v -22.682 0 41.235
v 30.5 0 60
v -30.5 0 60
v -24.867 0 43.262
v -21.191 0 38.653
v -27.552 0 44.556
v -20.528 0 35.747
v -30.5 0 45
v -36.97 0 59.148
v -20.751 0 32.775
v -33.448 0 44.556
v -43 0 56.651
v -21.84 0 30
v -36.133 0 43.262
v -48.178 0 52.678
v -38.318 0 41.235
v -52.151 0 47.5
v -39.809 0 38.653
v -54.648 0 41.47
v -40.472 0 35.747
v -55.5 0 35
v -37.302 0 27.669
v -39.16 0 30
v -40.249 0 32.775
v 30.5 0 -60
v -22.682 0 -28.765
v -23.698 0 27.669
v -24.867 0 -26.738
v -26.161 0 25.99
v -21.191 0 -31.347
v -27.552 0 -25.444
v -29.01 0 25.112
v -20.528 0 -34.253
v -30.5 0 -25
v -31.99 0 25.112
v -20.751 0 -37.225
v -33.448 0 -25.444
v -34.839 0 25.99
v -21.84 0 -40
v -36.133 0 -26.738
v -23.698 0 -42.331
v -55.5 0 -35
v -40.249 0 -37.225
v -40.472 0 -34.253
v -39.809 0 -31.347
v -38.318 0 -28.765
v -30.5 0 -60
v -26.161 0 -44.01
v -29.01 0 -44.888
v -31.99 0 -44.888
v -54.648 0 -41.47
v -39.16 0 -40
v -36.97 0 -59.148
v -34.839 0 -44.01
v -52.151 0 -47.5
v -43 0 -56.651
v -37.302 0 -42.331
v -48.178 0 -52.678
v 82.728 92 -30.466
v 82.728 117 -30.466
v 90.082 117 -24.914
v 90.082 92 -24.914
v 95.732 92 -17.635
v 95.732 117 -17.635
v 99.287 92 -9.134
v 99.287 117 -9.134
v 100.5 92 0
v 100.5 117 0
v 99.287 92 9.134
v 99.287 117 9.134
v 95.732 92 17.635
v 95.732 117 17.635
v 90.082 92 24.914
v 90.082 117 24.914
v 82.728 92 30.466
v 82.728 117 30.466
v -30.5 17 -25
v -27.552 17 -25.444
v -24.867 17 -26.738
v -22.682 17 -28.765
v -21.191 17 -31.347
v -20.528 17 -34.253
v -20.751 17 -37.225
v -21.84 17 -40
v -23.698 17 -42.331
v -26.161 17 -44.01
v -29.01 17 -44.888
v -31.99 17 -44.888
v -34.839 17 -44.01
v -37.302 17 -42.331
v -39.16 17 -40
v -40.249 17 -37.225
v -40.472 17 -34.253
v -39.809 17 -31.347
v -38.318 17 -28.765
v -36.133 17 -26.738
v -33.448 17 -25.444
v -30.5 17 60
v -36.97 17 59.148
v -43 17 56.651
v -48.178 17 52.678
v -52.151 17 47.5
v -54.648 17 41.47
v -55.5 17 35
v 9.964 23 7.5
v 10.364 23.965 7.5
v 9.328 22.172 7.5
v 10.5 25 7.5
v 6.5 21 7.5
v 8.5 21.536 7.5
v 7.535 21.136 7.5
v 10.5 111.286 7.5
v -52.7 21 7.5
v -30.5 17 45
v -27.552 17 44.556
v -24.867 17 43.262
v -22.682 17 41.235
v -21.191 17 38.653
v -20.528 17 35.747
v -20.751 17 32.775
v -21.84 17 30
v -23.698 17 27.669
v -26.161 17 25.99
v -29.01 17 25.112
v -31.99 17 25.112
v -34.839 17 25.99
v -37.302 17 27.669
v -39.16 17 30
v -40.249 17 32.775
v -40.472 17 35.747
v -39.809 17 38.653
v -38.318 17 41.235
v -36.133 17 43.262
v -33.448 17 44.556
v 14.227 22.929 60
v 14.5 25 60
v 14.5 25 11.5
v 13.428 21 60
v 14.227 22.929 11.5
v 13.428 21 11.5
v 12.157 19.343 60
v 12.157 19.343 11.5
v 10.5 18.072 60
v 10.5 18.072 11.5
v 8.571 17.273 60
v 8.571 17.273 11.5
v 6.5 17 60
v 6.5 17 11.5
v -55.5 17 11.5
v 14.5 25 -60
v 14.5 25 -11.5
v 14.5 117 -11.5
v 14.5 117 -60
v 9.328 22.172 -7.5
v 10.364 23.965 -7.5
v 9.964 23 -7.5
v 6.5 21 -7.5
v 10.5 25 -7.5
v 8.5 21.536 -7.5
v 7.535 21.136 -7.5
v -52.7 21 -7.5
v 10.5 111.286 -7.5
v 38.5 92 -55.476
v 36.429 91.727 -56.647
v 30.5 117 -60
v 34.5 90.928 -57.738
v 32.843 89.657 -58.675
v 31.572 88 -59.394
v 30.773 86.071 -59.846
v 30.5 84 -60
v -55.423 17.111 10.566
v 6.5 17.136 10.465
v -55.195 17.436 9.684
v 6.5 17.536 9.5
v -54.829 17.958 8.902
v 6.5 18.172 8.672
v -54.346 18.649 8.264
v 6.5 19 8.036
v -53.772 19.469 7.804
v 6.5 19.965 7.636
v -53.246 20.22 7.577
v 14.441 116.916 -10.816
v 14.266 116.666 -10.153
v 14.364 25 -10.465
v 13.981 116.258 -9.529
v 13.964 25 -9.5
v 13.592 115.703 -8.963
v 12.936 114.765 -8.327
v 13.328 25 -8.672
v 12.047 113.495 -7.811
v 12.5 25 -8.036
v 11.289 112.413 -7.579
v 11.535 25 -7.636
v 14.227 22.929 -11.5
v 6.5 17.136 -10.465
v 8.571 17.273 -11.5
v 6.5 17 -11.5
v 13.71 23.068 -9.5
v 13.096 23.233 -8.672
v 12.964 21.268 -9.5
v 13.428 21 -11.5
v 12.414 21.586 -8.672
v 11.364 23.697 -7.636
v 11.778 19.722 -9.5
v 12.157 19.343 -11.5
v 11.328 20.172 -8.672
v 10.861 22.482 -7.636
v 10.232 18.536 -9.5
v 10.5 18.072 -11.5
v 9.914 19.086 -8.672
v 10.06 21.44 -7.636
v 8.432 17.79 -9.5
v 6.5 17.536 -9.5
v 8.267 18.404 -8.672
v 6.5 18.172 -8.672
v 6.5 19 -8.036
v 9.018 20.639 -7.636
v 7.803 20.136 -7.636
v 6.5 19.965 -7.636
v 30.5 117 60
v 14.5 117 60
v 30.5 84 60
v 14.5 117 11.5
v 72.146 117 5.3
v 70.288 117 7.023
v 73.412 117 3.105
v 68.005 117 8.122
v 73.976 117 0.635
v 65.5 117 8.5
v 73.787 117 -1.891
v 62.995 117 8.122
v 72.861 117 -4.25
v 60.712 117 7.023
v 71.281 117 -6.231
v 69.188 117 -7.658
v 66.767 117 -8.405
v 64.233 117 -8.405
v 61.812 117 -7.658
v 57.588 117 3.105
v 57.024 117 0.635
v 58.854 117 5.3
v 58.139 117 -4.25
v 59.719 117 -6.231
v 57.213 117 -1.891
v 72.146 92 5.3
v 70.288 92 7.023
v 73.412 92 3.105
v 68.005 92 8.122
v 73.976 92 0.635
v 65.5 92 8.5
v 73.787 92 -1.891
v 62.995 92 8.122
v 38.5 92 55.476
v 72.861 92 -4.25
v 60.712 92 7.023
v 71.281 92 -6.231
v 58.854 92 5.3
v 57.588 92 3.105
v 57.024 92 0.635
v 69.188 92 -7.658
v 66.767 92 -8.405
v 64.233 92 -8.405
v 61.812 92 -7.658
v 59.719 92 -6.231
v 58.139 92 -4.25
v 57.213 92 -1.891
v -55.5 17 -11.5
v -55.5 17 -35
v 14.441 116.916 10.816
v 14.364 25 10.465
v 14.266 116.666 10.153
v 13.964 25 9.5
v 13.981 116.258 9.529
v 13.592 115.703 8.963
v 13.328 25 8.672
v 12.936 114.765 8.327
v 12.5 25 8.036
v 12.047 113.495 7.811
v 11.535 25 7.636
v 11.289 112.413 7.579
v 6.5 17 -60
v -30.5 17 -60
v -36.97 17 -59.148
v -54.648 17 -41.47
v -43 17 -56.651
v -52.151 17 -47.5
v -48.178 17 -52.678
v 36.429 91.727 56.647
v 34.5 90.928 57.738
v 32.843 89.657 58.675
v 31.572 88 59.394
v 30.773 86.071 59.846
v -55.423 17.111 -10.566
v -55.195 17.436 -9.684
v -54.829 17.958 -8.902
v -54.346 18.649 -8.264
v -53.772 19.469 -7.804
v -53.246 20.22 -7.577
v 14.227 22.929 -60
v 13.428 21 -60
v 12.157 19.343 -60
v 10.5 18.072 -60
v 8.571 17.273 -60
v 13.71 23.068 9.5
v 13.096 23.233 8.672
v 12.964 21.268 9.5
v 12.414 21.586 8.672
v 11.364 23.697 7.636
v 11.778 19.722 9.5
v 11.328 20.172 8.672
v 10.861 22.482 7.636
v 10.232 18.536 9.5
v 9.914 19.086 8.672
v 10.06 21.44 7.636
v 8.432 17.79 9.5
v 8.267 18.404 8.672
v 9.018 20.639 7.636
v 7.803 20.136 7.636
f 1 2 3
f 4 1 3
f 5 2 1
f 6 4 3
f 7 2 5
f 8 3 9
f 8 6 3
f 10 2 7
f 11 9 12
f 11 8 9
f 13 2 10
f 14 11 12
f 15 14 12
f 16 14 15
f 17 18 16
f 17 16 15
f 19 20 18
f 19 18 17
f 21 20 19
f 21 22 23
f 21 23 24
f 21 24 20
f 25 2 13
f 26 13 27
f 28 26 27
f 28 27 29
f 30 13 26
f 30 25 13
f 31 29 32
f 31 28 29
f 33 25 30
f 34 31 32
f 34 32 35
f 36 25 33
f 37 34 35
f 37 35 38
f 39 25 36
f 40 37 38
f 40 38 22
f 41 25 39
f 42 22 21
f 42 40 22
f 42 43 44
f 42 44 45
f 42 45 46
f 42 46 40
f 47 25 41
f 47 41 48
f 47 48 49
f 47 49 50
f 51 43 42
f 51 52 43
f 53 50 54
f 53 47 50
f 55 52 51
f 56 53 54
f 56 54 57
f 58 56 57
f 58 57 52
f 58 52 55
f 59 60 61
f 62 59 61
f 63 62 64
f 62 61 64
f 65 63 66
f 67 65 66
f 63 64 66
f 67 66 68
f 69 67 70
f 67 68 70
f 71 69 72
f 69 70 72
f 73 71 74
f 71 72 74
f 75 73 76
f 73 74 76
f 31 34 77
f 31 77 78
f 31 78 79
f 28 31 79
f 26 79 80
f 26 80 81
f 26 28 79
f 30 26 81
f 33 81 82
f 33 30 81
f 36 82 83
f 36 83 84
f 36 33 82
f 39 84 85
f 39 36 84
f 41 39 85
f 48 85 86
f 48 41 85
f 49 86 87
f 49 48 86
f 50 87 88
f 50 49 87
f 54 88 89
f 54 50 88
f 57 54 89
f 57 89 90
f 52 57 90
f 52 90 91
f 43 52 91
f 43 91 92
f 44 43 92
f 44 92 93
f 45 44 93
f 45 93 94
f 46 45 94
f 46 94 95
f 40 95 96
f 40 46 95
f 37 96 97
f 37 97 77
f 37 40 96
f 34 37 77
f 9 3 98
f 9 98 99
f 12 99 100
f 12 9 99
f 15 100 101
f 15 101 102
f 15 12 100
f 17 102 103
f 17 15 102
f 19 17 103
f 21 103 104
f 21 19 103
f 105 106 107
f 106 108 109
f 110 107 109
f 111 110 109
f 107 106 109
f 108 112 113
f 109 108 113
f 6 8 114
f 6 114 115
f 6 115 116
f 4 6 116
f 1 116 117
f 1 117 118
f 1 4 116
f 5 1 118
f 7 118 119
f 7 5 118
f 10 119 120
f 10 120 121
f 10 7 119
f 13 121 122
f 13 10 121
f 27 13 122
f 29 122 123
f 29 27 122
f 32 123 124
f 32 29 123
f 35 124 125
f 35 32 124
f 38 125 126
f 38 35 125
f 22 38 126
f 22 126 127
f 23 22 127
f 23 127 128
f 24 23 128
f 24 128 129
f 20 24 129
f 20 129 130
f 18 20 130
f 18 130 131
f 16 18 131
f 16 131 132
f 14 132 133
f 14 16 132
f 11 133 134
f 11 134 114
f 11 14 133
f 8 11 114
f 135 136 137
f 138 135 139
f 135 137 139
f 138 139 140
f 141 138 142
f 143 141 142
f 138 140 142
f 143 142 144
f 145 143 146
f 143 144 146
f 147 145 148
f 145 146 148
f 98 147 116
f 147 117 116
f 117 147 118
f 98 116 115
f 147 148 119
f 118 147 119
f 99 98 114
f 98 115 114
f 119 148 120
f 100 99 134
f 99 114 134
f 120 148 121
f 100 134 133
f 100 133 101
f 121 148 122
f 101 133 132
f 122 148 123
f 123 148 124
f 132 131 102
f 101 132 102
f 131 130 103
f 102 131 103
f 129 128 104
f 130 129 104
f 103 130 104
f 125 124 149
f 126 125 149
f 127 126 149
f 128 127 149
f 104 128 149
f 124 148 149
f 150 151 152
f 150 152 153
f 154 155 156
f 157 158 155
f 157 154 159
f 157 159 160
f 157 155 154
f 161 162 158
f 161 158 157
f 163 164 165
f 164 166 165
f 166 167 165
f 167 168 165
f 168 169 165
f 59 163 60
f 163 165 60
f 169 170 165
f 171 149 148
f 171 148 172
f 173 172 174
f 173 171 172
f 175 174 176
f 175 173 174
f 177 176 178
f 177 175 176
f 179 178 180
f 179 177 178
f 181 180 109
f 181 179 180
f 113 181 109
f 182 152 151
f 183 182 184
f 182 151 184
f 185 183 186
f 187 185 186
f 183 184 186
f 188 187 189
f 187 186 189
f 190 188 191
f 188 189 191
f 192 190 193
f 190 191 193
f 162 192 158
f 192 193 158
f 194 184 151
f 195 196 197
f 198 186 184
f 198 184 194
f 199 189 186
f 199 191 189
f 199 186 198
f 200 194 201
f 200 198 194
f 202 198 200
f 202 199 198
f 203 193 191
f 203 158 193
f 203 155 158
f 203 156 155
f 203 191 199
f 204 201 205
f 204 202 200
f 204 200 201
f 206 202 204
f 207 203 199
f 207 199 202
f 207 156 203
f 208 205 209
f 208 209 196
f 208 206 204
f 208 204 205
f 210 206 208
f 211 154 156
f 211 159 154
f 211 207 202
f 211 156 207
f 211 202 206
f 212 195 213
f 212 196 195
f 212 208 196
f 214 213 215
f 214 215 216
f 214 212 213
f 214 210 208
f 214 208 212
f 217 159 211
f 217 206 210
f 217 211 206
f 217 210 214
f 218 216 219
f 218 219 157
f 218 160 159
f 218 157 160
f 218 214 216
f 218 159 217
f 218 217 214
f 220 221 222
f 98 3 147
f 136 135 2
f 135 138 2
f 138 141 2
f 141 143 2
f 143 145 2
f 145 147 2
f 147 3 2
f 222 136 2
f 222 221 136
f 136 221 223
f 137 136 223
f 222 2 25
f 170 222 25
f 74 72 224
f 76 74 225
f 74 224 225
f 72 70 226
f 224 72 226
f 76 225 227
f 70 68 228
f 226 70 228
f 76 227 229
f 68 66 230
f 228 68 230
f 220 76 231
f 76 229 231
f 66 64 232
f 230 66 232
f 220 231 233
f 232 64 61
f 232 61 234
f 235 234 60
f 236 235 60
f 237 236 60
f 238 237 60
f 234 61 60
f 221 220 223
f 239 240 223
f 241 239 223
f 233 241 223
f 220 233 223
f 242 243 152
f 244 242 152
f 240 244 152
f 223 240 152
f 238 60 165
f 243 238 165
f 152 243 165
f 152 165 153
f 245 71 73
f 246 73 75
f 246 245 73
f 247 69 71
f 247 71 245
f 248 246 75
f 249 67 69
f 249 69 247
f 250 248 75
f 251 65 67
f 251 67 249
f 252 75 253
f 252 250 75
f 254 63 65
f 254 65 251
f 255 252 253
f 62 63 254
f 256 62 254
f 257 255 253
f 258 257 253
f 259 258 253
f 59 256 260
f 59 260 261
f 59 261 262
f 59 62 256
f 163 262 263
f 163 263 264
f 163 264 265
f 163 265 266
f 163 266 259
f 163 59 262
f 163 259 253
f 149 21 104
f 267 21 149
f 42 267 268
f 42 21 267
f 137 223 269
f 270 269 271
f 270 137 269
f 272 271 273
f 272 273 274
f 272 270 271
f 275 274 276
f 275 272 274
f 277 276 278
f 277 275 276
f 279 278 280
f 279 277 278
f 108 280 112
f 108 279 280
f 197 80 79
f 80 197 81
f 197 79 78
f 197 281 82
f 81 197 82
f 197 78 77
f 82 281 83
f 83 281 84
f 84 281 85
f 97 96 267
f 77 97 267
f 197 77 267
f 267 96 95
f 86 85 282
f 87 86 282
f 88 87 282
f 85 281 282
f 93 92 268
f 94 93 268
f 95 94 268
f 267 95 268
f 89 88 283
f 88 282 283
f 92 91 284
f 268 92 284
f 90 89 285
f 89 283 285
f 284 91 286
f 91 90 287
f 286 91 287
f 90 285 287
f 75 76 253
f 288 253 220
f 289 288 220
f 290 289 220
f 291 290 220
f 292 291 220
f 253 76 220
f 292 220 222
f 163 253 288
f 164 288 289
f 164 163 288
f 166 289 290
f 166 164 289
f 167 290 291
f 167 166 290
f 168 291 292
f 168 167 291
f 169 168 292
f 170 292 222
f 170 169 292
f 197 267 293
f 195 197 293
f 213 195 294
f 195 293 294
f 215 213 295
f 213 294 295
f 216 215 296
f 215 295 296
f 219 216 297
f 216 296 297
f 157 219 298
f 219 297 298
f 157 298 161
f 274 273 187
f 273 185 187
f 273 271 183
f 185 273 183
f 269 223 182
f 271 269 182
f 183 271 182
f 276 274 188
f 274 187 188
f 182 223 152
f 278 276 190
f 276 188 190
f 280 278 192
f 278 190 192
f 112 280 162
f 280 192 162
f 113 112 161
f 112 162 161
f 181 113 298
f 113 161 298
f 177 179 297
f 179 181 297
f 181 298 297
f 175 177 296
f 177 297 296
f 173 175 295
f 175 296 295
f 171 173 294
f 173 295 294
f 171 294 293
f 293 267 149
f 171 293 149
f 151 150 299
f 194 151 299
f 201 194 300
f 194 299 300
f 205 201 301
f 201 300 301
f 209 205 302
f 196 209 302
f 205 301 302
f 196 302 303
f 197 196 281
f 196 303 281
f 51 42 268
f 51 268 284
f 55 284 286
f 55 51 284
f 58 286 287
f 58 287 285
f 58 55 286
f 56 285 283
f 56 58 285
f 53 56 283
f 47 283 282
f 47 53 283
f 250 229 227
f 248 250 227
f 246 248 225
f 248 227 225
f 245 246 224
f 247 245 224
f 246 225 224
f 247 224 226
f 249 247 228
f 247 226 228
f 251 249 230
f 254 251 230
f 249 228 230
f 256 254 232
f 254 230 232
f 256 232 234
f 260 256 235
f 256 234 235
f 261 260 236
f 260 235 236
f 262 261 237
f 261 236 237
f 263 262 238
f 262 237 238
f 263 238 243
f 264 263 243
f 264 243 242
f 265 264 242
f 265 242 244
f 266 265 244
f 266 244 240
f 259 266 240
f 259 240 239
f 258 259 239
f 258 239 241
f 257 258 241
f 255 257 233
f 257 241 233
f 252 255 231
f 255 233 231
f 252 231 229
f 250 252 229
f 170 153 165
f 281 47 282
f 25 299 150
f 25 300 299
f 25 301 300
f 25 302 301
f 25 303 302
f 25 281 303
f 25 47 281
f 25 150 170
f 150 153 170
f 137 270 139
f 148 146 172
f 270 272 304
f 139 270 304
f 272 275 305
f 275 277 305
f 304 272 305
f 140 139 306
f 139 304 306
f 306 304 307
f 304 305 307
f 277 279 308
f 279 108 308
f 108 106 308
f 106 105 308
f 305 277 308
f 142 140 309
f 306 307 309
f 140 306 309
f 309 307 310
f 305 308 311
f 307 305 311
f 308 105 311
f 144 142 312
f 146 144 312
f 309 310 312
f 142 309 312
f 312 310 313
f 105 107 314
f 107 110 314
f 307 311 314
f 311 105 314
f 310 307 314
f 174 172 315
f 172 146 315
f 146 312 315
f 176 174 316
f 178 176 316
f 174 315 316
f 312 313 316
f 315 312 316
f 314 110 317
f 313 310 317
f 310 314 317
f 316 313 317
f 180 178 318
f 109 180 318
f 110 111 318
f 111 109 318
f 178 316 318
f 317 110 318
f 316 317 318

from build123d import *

# Parameters (mm, degrees)
SKETCH1_R           = 10
BOSS_EXTRUDE1_DEPTH = 17
SKETCH2_W           = 16
SKETCH2_H           = 120
BOSS_EXTRUDE2_DEPTH = 100
FILLET1_R           = 8
SKETCH3_R           = 8.5
BOSS_EXTRUDE3_DEPTH = 25
RIB2_REACH          = 167.497
SKETCH6_WALL_W      = 455.059513806
SKETCH6_WALL_H      = 15
FILLET2_R           = 4
FILLET3_R           = 8


with BuildPart() as part:
    # Sketch1 → Boss-Extrude1 (new body)
    with BuildSketch(Plane(origin=(0, 0, 0), x_dir=(1, 0, 0), z_dir=(0, 1, 0))):
        with BuildLine():
            Line((-30.5, 60), (30.5, 60))
            Line((30.5, 60), (30.5, -60))
            Line((30.5, -60), (-30.5, -60))
            ThreePointArc((-30.5, -60), (-48.17766953, -52.67766953), (-55.5, -35))
            Line((-55.5, -35), (-55.5, 35))
            ThreePointArc((-55.5, 35), (-48.17766953, 52.67766953), (-30.5, 60))
        make_face()
        with Locations(Location((-30.5, 35, 0), (0, 0, 270))):
            Circle(SKETCH1_R, mode=Mode.SUBTRACT)
        with Locations(Location((-30.5, -35, 0), (0, 0, 270))):
            Circle(SKETCH1_R, mode=Mode.SUBTRACT)
    extrude(amount=BOSS_EXTRUDE1_DEPTH)

    # Sketch2 → Boss-Extrude2 (add)
    with BuildSketch(Plane(origin=(0, 17, 0), x_dir=(1, 0, 0), z_dir=(0, 1, 0))):
        with Locations((22.5, 0)):
            Rectangle(SKETCH2_W, SKETCH2_H)
    extrude(amount=BOSS_EXTRUDE2_DEPTH)

    # Fillet1
    fillet1_edges = [part.edges().sort_by_distance(p)[0] for p in [
        (14.5, 17, 0),
    ]]
    fillet(fillet1_edges, radius=FILLET1_R)

    # Sketch3 → Boss-Extrude3 (add)
    with BuildSketch(Plane(origin=(0, 117, 0), x_dir=(1, 0, 0), z_dir=(0, 1, 0))):
        with BuildLine():
            Line((30.5, 60), (82.727979275, 30.466321244))
            ThreePointArc((82.727979275, 30.466321244), (100.5, 0), (82.727979275, -30.466321244))
            Line((82.727979275, -30.466321244), (30.5, -60))
            Line((30.5, -60), (30.5, 60))
        make_face()
        with Locations(Location((65.5, 0, 0), (0, 0, 270))):
            Circle(SKETCH3_R, mode=Mode.SUBTRACT)
    extrude(amount=-BOSS_EXTRUDE3_DEPTH)

    # Sketch6 wall → Rib2 (add, up to next)
    with BuildSketch(Plane(origin=(-20.5, 67, 0), x_dir=(-0.573462344363, -0.819231920519, 0), z_dir=(0.819231920519, -0.573462344363, 0)), mode=Mode.PRIVATE) as rib2_sk1:
        Rectangle(SKETCH6_WALL_W, SKETCH6_WALL_H)
    rib2_tool1 = extrude(rib2_sk1.sketch, amount=RIB2_REACH, mode=Mode.PRIVATE) - part.part
    add(rib2_tool1.solids().sort_by_distance((-20.5, 67, 0))[0])

    # Fillet2
    fillet2_edges = [part.edges().sort_by_distance(p)[0] for p in [
        (12.156854249, 19.343145751, -7.5),
        (-24.5, 17, -7.5),
        (14.5, 71, -7.5),
        (12.156854249, 19.343145751, 7.5),
        (-24.5, 17, 7.5),
        (14.5, 71, 7.5),
    ]]
    fillet(fillet2_edges, radius=FILLET2_R)

    # Fillet3
    fillet3_edges = [part.edges().sort_by_distance(p)[0] for p in [
        (30.5, 92, 0),
    ]]
    fillet(fillet3_edges, radius=FILLET3_R)


solid = part.part
